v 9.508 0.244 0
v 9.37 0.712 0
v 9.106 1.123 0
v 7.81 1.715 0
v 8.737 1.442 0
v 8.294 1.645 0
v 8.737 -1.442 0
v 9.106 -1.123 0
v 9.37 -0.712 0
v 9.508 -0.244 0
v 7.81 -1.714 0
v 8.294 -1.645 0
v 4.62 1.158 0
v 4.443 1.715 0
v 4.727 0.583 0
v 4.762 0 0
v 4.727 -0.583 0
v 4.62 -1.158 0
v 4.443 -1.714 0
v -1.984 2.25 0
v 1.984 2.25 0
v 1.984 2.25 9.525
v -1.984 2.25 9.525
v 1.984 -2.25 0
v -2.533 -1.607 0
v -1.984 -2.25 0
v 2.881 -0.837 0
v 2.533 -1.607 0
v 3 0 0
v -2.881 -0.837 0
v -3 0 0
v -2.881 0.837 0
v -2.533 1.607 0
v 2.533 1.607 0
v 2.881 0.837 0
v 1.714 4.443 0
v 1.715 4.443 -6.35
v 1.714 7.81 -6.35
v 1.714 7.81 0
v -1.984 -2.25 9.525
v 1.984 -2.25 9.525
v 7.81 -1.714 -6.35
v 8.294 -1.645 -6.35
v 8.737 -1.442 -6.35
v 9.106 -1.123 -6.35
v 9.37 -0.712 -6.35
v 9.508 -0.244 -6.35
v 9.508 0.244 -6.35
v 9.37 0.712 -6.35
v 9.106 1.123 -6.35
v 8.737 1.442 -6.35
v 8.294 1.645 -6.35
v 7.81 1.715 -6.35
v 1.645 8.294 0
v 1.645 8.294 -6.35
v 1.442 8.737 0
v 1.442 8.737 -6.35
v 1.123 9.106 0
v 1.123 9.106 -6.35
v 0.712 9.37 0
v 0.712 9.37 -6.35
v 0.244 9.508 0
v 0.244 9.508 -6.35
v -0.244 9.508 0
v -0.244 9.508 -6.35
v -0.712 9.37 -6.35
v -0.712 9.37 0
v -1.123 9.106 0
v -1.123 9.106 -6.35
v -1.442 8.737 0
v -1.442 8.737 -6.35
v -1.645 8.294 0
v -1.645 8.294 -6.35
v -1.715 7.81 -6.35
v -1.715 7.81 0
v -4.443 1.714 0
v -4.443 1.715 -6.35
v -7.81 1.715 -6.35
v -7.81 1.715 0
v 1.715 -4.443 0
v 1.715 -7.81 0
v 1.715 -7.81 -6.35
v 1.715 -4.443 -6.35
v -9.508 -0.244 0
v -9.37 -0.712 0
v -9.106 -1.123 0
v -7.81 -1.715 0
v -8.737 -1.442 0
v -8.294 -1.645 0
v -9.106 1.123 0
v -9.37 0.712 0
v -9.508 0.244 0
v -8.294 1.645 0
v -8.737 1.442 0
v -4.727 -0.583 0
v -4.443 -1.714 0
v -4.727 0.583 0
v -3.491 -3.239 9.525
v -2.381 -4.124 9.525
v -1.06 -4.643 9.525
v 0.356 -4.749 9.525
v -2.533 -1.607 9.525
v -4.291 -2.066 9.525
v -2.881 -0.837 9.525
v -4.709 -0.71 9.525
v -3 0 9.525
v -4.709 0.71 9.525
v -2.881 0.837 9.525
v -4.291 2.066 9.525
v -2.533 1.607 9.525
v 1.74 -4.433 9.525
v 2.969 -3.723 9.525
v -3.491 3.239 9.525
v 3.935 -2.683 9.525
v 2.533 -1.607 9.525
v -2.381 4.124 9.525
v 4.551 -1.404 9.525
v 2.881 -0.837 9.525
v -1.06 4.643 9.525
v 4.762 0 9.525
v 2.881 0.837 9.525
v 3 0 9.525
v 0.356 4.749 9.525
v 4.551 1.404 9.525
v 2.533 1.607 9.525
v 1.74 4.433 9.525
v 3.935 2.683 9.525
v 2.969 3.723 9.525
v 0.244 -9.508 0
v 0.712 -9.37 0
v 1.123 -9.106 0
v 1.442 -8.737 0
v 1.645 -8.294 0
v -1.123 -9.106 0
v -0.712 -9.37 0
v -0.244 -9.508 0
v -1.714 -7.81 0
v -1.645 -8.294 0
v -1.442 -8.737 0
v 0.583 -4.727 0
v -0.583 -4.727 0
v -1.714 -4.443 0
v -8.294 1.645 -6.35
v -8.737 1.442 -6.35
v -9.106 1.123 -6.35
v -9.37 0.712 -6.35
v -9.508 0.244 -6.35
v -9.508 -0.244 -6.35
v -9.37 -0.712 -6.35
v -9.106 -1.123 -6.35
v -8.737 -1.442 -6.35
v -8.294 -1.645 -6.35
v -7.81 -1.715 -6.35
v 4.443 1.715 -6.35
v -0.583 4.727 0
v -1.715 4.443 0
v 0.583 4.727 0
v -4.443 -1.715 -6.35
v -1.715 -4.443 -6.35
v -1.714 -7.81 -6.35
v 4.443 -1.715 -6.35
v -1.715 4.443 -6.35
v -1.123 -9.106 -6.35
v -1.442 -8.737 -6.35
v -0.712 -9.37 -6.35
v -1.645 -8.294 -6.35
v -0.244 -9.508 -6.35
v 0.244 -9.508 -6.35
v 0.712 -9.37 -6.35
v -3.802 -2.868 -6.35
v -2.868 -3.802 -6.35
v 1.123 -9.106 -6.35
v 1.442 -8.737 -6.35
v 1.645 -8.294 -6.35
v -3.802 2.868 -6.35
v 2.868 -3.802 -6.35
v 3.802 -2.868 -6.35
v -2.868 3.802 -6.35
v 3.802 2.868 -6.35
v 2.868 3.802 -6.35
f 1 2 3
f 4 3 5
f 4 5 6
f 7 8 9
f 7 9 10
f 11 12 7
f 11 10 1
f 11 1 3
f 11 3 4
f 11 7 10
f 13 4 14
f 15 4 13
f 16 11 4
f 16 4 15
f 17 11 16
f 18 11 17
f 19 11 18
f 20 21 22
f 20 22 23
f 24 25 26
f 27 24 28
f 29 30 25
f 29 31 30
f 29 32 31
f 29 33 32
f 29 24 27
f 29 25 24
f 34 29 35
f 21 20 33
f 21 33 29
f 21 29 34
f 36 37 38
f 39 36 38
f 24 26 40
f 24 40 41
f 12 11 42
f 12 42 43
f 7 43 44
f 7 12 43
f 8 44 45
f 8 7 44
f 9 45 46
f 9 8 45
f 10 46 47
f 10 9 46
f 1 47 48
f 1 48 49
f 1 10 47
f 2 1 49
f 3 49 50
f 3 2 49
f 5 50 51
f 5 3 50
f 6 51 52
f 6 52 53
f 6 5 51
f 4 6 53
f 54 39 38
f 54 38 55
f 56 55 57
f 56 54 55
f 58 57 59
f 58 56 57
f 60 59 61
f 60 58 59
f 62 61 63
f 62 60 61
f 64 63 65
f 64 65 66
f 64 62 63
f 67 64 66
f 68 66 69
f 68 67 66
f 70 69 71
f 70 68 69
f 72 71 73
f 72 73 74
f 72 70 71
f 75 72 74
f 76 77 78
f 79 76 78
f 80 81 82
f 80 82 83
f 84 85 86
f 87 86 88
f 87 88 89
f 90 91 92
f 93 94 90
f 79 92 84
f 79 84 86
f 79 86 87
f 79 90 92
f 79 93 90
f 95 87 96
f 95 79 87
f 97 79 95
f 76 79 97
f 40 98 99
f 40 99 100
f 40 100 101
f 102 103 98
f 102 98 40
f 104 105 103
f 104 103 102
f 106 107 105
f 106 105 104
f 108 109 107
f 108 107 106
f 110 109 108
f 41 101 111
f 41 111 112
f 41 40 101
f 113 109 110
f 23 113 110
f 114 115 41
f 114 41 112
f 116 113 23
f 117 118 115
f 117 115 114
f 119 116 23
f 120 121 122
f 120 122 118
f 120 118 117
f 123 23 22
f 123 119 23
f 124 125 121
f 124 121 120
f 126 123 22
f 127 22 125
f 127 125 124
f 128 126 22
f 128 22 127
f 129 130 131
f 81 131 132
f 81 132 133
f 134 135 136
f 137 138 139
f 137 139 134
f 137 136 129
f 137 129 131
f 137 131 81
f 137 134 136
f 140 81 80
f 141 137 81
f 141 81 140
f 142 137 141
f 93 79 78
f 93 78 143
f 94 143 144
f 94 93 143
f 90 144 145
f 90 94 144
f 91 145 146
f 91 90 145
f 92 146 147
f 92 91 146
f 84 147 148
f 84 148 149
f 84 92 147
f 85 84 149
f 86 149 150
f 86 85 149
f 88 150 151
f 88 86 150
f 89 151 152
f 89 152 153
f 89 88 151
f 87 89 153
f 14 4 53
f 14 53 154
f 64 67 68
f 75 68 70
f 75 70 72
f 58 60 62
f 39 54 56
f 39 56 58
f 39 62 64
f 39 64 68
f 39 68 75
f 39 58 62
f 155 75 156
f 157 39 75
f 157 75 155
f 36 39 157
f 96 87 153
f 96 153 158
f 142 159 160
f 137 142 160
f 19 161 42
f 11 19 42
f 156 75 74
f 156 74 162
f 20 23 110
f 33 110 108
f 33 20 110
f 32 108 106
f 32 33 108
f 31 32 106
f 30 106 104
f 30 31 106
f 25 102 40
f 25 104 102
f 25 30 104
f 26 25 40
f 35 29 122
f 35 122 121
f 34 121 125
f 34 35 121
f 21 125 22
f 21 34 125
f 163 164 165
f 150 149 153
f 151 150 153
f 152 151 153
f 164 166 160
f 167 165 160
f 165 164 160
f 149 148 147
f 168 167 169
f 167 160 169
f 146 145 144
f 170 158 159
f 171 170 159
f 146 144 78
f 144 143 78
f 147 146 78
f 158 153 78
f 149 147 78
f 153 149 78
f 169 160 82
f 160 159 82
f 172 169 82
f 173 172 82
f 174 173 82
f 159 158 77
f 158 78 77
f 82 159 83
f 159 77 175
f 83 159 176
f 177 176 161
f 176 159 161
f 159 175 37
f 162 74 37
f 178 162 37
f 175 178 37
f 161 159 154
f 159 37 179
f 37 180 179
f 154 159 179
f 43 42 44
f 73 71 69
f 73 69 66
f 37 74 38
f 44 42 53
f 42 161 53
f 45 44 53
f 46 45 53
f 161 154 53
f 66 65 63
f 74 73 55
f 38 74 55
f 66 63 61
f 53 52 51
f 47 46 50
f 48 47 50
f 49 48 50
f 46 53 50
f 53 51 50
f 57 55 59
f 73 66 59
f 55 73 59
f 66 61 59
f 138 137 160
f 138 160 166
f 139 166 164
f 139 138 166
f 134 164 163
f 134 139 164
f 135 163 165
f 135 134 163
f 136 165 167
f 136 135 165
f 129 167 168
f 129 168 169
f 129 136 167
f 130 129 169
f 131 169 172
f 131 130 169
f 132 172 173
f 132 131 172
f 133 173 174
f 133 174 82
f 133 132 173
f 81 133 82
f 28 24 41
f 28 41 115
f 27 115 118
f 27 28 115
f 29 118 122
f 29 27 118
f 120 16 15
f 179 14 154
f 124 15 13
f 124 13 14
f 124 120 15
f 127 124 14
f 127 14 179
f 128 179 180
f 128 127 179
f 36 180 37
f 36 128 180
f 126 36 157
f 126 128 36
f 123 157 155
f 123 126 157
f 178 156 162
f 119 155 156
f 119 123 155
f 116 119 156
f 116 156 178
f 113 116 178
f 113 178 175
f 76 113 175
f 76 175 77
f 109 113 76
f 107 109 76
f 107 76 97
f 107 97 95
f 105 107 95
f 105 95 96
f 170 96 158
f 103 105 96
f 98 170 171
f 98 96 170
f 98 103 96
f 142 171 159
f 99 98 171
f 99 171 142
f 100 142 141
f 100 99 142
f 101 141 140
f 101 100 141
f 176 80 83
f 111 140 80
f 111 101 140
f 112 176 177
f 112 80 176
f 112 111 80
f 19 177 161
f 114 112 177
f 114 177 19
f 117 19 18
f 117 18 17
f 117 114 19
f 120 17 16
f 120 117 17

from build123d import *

# Parameters (mm, degrees)
F0_R          = 4.7625
F1_DEPTH      = 9.525
F1_DEPTH_BACK = 6.35
F4_DEPTH      = 9.526
F6_DEPTH      = 6.35
F7_COUNT      = 4


with BuildPart() as f1:
    # F0 (on Top) → F1 (new body, two sides)
    with BuildSketch(Plane.XY) as f1_sk:
        Circle(F0_R)
    extrude(amount=F1_DEPTH)
    extrude(f1_sk.sketch, amount=-F1_DEPTH_BACK)

    # F2 (on Top) → F4 (cut, through all)
    with BuildSketch(Plane.XY):
        with BuildLine():
            ThreePointArc((1.9843134833, -2.25), (2.7343134833, -1.2343134833), (3, 0))
            ThreePointArc((3, 0), (2.7343134833, 1.2343134833), (1.9843134833, 2.25))
            Line((1.9843134833, 2.25), (-1.9843134833, 2.25))
            ThreePointArc((-1.9843134833, 2.25), (-3, 0), (-1.9843134833, -2.25))
            Line((-1.9843134833, -2.25), (1.9843134833, -2.25))
        make_face()
    extrude(amount=F4_DEPTH, mode=Mode.SUBTRACT)



with BuildPart() as f6:
    # F5 (on Top) → F6 (new body, through all)
    with BuildSketch(Plane.XY):
        with BuildLine():
            Line((0, 1.7145), (-7.8105, 1.7145))
            ThreePointArc((-7.8105, 1.7145), (-9.525, 0), (-7.8105, -1.7145))
            Line((-7.8105, -1.7145), (0, -1.7145))
            Line((0, -1.7145), (0, 1.7145))
        make_face()
    extrude(amount=-F6_DEPTH)


with BuildPart() as f1_1:
    add(f1.part)

    add(f6.part)  # F7 merges F6
    # F7: F6 ×4 about axis
    f7_axis = Axis((0, 0, 0), (0, 0, -1))
    for i in range(1, F7_COUNT):
        add(f6.part.rotate(f7_axis, i * 360 / F7_COUNT))


solid = f1_1.part
